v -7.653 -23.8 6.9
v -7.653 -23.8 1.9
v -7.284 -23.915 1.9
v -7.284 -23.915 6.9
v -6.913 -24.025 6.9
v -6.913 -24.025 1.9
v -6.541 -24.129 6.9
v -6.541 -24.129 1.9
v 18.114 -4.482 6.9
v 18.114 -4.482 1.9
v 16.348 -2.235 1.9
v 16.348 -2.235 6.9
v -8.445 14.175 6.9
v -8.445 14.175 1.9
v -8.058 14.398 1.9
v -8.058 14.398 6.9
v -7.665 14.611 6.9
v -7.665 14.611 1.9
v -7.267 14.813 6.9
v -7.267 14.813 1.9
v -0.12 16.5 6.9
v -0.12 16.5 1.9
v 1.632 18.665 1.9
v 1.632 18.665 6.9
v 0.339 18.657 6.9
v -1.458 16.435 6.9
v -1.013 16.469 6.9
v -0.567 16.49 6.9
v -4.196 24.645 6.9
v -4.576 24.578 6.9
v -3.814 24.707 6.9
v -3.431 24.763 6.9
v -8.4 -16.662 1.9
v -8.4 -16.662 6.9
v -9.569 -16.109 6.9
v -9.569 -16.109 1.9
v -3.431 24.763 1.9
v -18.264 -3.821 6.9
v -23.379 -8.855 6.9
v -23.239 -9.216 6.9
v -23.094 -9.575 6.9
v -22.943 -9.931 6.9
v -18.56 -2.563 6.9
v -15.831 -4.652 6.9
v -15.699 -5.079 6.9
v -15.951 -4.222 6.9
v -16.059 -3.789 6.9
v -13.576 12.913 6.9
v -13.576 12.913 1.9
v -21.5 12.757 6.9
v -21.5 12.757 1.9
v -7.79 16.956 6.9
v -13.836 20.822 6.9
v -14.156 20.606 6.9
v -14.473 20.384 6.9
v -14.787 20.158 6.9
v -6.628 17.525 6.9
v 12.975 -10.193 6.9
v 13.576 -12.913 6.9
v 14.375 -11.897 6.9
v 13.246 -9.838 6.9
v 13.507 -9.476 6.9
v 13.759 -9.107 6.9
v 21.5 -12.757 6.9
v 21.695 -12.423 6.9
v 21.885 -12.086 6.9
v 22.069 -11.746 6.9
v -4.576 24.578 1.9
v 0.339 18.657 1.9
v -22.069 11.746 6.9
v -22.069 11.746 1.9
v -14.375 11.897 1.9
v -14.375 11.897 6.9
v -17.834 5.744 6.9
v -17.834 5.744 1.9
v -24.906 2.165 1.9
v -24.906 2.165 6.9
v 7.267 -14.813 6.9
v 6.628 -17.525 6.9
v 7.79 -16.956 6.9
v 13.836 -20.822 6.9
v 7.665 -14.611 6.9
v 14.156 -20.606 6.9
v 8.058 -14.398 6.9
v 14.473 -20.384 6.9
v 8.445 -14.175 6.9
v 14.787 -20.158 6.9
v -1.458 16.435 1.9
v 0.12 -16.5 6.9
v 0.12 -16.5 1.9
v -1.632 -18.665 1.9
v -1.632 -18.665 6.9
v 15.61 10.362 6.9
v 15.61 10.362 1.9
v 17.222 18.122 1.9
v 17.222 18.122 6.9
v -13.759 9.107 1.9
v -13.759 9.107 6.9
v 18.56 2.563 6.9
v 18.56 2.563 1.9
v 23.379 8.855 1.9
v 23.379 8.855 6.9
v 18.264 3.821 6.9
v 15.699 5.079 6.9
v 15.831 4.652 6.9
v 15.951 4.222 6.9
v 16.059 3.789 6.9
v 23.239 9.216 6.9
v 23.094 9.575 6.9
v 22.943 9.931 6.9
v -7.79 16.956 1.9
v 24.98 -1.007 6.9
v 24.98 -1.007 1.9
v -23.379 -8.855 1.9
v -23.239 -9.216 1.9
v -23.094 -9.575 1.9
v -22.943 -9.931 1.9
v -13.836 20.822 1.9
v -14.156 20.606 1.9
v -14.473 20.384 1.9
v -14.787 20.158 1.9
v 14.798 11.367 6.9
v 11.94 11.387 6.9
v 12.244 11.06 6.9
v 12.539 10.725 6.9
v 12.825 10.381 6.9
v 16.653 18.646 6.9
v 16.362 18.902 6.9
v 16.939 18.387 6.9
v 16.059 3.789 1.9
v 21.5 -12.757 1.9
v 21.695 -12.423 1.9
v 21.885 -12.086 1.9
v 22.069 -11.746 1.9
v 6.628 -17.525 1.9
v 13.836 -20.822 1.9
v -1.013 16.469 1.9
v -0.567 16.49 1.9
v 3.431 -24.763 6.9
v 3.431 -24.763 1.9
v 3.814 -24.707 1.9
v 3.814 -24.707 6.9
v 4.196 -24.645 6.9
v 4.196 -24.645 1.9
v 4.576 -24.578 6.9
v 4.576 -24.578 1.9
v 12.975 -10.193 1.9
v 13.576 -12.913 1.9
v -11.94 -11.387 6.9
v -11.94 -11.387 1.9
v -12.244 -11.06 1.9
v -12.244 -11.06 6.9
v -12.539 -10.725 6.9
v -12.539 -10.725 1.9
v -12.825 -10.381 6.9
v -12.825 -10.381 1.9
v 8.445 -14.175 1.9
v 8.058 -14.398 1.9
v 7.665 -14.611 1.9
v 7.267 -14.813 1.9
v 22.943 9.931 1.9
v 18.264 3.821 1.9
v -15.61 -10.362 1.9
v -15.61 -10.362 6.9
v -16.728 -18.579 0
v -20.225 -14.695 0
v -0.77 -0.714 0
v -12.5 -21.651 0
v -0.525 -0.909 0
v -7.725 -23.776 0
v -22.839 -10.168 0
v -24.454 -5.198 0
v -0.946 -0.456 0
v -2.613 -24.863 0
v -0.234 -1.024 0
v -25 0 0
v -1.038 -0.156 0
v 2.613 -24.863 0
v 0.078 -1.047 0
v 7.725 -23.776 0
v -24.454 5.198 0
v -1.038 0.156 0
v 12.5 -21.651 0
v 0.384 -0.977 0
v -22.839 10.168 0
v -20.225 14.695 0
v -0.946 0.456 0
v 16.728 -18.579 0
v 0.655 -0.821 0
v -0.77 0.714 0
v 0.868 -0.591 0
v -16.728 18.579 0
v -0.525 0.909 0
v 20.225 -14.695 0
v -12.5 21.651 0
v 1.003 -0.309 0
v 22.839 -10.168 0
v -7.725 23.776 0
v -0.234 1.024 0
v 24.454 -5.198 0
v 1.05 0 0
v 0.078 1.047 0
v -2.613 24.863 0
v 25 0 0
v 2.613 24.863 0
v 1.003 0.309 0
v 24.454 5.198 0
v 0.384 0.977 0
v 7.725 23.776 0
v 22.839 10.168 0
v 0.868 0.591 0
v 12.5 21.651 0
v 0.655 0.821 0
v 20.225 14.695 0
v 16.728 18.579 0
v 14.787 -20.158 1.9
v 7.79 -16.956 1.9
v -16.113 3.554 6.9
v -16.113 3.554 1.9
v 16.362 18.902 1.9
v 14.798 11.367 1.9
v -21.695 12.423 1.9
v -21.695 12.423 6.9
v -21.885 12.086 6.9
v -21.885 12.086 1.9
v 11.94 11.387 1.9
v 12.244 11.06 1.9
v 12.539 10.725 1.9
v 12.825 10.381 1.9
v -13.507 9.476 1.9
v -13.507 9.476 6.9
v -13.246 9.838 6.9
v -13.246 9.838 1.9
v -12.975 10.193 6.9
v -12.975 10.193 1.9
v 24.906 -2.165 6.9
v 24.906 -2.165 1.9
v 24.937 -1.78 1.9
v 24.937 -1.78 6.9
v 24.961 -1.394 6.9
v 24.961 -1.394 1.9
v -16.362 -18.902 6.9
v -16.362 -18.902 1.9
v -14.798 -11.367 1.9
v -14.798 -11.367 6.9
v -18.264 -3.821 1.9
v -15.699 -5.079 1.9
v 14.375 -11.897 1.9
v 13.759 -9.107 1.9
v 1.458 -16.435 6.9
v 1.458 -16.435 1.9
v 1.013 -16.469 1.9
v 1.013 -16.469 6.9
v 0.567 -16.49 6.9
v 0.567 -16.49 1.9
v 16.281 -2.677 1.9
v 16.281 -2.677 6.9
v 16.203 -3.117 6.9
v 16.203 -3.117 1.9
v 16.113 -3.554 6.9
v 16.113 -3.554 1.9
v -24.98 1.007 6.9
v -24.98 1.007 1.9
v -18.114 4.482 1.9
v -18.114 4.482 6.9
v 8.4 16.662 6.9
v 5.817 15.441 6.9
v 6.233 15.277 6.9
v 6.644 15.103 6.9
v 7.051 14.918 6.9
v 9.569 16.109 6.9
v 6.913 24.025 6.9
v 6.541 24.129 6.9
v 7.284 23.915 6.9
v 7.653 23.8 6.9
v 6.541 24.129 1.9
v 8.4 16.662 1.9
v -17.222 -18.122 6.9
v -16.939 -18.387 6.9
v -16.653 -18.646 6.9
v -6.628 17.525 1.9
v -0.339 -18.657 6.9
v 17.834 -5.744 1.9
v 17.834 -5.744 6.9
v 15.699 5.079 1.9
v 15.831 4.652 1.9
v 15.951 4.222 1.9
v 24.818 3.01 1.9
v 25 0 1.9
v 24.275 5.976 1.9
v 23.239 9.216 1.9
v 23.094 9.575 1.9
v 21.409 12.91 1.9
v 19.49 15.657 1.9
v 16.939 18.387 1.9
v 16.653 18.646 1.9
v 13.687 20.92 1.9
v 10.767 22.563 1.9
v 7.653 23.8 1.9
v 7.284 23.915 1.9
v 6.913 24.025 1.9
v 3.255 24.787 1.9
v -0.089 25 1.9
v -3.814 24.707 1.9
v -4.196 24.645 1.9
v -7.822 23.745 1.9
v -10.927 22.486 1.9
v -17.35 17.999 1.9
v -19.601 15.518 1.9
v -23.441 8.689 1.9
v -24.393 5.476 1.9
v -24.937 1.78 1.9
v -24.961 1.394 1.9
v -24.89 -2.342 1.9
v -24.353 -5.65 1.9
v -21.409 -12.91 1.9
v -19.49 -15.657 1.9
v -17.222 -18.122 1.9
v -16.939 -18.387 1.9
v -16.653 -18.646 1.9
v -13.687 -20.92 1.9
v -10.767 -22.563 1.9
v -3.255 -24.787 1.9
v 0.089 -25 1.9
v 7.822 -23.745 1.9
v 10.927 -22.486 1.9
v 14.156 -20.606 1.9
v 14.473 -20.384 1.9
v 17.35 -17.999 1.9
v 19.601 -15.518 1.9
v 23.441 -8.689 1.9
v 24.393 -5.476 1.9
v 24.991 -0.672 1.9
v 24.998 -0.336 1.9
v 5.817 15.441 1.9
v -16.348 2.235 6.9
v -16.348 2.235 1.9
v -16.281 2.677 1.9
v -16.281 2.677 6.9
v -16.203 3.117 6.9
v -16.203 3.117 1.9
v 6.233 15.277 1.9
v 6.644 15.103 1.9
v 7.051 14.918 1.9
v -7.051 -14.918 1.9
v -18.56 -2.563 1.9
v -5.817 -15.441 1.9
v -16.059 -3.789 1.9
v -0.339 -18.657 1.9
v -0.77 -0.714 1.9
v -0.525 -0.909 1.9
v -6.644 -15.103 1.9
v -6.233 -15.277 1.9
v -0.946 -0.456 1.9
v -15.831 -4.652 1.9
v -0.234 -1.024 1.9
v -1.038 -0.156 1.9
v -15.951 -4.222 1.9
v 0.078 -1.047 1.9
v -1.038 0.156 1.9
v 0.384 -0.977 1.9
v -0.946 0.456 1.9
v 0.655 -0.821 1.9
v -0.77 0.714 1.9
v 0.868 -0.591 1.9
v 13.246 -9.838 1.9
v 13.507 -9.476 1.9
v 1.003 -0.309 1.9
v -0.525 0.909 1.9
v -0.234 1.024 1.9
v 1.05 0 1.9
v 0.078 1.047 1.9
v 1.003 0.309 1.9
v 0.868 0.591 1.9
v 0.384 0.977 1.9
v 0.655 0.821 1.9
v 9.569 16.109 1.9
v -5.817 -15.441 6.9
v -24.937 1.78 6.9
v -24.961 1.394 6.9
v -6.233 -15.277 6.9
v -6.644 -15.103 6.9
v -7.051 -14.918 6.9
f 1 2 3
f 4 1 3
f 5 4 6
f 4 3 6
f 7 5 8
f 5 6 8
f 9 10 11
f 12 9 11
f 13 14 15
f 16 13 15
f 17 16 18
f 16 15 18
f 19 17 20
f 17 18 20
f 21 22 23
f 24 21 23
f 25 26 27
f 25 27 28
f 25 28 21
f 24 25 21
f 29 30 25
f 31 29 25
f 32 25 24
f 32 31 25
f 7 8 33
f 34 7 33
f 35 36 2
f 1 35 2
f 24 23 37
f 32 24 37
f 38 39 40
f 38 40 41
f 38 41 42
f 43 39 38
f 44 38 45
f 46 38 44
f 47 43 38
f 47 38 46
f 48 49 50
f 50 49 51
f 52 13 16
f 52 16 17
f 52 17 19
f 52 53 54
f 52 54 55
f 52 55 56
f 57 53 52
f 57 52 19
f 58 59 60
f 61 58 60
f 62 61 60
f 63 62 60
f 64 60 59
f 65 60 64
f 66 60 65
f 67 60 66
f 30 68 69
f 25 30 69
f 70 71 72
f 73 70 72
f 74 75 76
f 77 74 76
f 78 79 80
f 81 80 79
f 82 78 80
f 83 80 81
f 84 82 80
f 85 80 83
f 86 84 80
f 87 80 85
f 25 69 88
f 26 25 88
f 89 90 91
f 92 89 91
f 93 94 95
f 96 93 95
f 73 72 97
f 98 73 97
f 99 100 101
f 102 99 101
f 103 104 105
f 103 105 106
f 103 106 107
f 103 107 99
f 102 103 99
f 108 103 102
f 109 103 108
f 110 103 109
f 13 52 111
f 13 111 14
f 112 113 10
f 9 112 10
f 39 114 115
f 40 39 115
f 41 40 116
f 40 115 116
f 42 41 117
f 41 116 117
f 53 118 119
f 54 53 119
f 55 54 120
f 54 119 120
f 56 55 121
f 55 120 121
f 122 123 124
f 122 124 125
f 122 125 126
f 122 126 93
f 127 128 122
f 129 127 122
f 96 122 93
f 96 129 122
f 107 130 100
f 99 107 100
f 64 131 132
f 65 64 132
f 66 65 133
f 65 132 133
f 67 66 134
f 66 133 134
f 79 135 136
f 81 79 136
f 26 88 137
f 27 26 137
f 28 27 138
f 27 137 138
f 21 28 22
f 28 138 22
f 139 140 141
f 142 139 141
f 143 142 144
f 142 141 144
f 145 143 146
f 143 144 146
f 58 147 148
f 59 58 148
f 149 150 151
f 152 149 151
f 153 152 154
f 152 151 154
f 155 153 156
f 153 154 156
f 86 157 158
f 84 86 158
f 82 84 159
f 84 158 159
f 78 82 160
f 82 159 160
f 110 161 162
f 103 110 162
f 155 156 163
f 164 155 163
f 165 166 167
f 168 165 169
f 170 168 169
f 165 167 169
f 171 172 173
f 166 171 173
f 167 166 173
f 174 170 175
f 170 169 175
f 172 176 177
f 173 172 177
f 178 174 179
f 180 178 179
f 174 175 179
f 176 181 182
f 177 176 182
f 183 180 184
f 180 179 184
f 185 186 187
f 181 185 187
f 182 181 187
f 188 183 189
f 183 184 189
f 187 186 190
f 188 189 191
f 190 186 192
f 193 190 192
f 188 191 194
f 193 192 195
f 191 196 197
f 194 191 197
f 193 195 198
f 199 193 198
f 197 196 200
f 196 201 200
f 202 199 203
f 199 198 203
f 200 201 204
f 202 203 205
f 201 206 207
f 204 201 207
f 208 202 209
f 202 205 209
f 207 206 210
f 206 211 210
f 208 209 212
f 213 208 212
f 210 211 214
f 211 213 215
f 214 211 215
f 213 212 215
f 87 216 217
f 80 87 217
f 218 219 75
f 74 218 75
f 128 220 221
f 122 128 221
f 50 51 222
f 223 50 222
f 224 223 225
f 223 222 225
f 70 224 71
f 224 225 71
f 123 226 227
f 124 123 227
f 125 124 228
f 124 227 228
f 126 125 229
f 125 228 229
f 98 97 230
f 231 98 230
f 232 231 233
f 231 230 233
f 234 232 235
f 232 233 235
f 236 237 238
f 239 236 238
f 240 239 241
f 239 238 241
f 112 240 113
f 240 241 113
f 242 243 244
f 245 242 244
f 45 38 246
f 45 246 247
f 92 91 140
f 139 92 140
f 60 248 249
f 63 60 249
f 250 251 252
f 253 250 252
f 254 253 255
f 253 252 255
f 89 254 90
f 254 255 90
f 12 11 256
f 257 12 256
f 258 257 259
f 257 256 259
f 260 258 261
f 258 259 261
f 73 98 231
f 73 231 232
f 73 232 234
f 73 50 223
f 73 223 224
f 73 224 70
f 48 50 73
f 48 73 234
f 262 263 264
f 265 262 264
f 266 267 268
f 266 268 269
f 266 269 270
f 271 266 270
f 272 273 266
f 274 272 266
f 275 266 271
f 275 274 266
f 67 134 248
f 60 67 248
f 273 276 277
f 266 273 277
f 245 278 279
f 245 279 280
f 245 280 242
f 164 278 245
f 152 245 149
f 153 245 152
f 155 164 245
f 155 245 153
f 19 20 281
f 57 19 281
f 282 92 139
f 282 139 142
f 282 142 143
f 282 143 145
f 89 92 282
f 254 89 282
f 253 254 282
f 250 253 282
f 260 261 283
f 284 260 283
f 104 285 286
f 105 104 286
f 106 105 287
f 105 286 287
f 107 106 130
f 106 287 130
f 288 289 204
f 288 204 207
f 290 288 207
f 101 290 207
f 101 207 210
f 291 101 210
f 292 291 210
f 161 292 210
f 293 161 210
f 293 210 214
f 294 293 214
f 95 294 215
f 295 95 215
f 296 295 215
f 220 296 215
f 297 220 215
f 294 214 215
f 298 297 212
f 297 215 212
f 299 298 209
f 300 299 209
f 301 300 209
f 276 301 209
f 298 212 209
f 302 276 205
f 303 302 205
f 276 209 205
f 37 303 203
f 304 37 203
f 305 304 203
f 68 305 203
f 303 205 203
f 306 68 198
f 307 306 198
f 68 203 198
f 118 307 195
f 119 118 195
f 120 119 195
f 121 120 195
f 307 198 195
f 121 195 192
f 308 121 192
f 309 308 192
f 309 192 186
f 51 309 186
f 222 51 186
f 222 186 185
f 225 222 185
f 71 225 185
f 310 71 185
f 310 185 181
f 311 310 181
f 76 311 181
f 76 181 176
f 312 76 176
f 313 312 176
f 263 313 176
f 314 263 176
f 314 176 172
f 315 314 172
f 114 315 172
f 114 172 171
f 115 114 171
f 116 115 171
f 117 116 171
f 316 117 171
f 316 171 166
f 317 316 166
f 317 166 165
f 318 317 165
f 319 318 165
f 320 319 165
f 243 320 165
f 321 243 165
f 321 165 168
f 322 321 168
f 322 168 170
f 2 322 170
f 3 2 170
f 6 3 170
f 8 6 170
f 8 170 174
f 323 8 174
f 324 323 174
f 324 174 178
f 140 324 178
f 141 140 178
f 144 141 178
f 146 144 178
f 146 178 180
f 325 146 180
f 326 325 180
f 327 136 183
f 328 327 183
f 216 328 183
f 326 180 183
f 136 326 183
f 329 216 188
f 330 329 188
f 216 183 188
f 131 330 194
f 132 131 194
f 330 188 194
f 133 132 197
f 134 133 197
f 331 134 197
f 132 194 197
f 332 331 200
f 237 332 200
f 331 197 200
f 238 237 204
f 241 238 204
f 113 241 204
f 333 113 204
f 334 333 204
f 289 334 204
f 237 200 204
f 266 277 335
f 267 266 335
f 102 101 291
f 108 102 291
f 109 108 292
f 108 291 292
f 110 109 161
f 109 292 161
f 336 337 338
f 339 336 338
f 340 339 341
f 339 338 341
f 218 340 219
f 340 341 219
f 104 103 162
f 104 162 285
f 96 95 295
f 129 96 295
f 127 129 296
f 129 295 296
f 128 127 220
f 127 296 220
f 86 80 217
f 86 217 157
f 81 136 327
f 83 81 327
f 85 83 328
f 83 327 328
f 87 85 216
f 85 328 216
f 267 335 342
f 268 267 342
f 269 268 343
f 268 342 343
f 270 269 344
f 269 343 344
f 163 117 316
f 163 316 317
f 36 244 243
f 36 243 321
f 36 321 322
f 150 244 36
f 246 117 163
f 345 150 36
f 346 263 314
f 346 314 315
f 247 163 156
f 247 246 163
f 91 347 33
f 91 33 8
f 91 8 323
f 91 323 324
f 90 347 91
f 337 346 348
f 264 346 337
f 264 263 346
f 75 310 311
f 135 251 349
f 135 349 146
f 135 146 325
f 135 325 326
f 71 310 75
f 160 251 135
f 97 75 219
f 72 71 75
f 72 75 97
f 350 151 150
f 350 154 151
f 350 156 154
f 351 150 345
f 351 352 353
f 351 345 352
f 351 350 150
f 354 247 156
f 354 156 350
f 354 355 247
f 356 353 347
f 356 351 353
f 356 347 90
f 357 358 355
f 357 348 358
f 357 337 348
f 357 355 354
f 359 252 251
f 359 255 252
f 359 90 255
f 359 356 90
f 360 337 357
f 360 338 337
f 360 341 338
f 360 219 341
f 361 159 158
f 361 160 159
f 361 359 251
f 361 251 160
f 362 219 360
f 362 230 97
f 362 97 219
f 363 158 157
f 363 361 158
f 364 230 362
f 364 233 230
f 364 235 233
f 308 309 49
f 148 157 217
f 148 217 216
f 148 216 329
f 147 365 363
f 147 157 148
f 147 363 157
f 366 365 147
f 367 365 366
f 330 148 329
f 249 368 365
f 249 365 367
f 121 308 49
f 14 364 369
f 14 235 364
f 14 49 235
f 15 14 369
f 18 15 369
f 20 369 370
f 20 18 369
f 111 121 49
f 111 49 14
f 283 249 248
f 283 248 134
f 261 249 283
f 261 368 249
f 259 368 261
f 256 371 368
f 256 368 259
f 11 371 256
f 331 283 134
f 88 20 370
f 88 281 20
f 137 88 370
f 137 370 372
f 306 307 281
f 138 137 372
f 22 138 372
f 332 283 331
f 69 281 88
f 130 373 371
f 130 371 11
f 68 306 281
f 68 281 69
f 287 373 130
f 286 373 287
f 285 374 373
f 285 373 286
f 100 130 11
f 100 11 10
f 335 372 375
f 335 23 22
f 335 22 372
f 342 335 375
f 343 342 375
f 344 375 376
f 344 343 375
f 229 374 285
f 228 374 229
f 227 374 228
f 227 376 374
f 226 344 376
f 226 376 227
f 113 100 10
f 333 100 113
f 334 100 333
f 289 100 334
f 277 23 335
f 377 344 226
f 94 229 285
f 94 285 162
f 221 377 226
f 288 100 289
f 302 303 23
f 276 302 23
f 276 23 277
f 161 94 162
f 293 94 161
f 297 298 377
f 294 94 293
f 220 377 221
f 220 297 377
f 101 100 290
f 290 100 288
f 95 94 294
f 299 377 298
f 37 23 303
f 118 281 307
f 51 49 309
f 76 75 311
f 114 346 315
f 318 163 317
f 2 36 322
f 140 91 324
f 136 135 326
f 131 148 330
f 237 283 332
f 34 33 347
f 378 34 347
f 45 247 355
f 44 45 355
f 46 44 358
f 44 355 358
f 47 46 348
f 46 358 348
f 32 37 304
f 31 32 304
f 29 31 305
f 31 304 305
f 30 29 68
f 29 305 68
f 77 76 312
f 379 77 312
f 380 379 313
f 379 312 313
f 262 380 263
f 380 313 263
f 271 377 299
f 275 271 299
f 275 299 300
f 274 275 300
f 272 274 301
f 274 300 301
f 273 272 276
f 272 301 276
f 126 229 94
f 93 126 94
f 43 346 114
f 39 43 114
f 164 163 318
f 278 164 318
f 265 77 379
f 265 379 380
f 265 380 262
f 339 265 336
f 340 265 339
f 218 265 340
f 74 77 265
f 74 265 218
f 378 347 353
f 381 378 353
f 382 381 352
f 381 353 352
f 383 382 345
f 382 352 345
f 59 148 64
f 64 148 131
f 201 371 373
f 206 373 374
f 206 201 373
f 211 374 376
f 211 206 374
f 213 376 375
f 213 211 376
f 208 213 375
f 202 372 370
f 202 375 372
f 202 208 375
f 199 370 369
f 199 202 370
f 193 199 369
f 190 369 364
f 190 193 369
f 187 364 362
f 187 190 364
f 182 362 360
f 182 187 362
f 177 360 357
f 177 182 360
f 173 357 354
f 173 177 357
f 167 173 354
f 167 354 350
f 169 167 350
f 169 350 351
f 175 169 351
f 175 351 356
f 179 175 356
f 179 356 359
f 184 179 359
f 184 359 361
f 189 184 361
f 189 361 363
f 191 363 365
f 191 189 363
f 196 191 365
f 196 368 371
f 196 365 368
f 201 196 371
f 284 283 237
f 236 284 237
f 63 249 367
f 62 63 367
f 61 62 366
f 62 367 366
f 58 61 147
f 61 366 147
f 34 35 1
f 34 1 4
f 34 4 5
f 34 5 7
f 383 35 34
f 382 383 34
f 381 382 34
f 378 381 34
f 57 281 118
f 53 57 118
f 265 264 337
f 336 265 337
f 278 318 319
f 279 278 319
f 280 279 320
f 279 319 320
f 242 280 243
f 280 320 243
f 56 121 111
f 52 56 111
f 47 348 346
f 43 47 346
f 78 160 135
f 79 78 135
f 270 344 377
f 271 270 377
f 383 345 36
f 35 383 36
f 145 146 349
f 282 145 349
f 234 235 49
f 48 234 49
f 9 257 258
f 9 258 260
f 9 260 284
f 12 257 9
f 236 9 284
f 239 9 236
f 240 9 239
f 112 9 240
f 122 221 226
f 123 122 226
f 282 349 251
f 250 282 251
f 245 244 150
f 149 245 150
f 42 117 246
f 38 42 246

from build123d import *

# Parameters (mm, degrees)
F0_R     = 25
F1_DEPTH = 1.9
F2_R     = 1.05
F3_DEPTH = 25.4
F5_DEPTH = 5


with BuildPart() as f1:
    # F0 (on Top) → F1 (new body)
    with BuildSketch(Plane.XY):
        Circle(F0_R)
    extrude(amount=F1_DEPTH)

    # F2 (on Top) → F3 (cut)
    with BuildSketch(Plane.XY):
        Circle(F2_R)
    extrude(amount=F3_DEPTH, mode=Mode.SUBTRACT)

    # F4 (on face) → F5 (join)
    with BuildSketch(Plane.XY.offset(1.9)):
        with BuildLine():
            ThreePointArc((-8.4449654791, 14.1750681853), (-7.8625386646, 14.5062223114), (-7.267148147, 14.8134586714))
            Line((-7.267148147, 14.8134586714), (-6.6282985683, 17.5245980034))
            Line((-6.6282985683, 17.5245980034), (-13.8357791201, 20.8223729709))
            ThreePointArc((-13.8357791201, 20.8223729709), (-14.3152843529, 20.4956735409), (-14.7870786227, 20.1579340659))
            Line((-14.7870786227, 20.1579340659), (-7.7896110966, 16.9562503322))
            Line((-7.7896110966, 16.9562503322), (-8.4449654791, 14.1750681853))
        make_face()
        with BuildLine():
            ThreePointArc((-1.4583194007, 16.4354283341), (-0.7898885826, 16.4810823682), (-0.1201554013, 16.4995624996))
            Line((-0.1201554013, 16.4995624996), (1.631747451, 18.6650281904))
            Line((1.631747451, 18.6650281904), (-3.4311172084, 24.7634293809))
            ThreePointArc((-3.4311172084, 24.7634293809), (-4.0048860655, 24.6771328886), (-4.5764976809, 24.5775439981))
            Line((-4.5764976809, 24.5775439981), (0.3388442045, 18.6568392545))
            Line((0.3388442045, 18.6568392545), (-1.4583194007, 16.4354283341))
        make_face()
        with BuildLine():
            ThreePointArc((5.8171647201, 15.4405503341), (6.4392086206, 15.1916619348), (7.0506355953, 14.917725621))
            Line((7.0506355953, 14.917725621), (9.5686058756, 16.1086206327))
            Line((9.5686058756, 16.1086206327), (7.6531195462, 23.7997848984))
            ThreePointArc((7.6531195462, 23.7997848984), (7.0987290239, 23.9709834226), (6.5405147537, 24.1292699176))
            Line((6.5405147537, 24.1292699176), (8.4001872552, 16.6622123514))
            Line((8.4001872552, 16.6622123514), (5.8171647201, 15.4405503341))
        make_face()
        with BuildLine():
            ThreePointArc((11.9404880253, 11.3874819745), (12.3929415847, 10.8933465417), (12.8249617418, 10.3812502291))
            Line((12.8249617418, 10.3812502291), (15.6102845553, 10.3617031995))
            Line((15.6102845553, 10.3617031995), (17.2215621154, 18.1223011316))
            ThreePointArc((17.2215621154, 18.1223011316), (16.7963537699, 18.5170867049), (16.3620980272, 18.9018980039))
            Line((16.3620980272, 18.9018980039), (14.7977701984, 11.3674299434))
            Line((14.7977701984, 11.3674299434), (11.9404880253, 11.3874819745))
        make_face()
        with BuildLine():
            ThreePointArc((15.6988512365, 5.0789831515), (15.8921004786, 4.4374702679), (16.0591469276, 3.7886409118))
            Line((16.0591469276, 3.7886409118), (18.5601549312, 2.5625233696))
            Line((18.5601549312, 2.5625233696), (23.379063099, 8.8554733703))
            ThreePointArc((23.379063099, 8.8554733703), (23.167254658, 9.3956538681), (22.9429671184, 9.9307733739))
            Line((22.9429671184, 9.9307733739), (18.2644732712, 3.8211886228))
            Line((18.2644732712, 3.8211886228), (15.6988512365, 5.0789831515))
        make_face()
        with BuildLine():
            Line((18.1136734135, -4.4818859684), (16.3478644266, -2.2354705742))
            ThreePointArc((16.3478644266, -2.2354705742), (16.2436339688, -2.8973014145), (16.1126211118, -3.5543552028))
            Line((16.1126211118, -3.5543552028), (17.8339589977, -5.7441956409))
            Line((17.8339589977, -5.7441956409), (24.9060539105, -2.1652894973))
            ThreePointArc((24.9060539105, -2.1652894973), (24.9495966334, -1.5867034474), (24.9797001948, -1.0072627157))
            Line((24.9797001948, -1.0072627157), (18.1136734135, -4.4818859684))
        make_face()
        with BuildLine():
            Line((14.3752383867, -11.8972680768), (13.7589825736, -9.1071619365))
            ThreePointArc((13.7589825736, -9.1071619365), (13.3779165365, -9.6582270186), (12.9747930765, -10.1933676782))
            Line((12.9747930765, -10.1933676782), (13.5755287655, -12.9132062568))
            Line((13.5755287655, -12.9132062568), (21.5000952923, -12.7571902244))
            ThreePointArc((21.5000952923, -12.7571902244), (21.7903650088, -12.2547946855), (22.0688972917, -11.7457980712))
            Line((22.0688972917, -11.7457980712), (14.3752383867, -11.8972680768))
        make_face()
        with BuildLine():
            Line((7.7896110966, -16.9562503322), (8.4449654791, -14.1750681853))
            ThreePointArc((8.4449654791, -14.1750681853), (7.8625386646, -14.5062223114), (7.267148147, -14.8134586714))
            Line((7.267148147, -14.8134586714), (6.6282985683, -17.5245980034))
            Line((6.6282985683, -17.5245980034), (13.8357791201, -20.8223729709))
            ThreePointArc((13.8357791201, -20.8223729709), (14.3152843529, -20.4956735409), (14.7870786227, -20.1579340659))
            Line((14.7870786227, -20.1579340659), (7.7896110966, -16.9562503322))
        make_face()
        with BuildLine():
            Line((-0.3388442045, -18.6568392545), (1.4583194007, -16.4354283341))
            ThreePointArc((1.4583194007, -16.4354283341), (0.7898885826, -16.4810823682), (0.1201554013, -16.4995624996))
            Line((0.1201554013, -16.4995624996), (-1.631747451, -18.6650281904))
            Line((-1.631747451, -18.6650281904), (3.4311172084, -24.7634293809))
            ThreePointArc((3.4311172084, -24.7634293809), (4.0048860655, -24.6771328886), (4.5764976809, -24.5775439981))
            Line((4.5764976809, -24.5775439981), (-0.3388442045, -18.6568392545))
        make_face()
        with BuildLine():
            Line((-8.4001872552, -16.6622123514), (-5.8171647201, -15.4405503341))
            ThreePointArc((-5.8171647201, -15.4405503341), (-6.4392086206, -15.1916619348), (-7.0506355953, -14.917725621))
            Line((-7.0506355953, -14.917725621), (-9.5686058756, -16.1086206327))
            Line((-9.5686058756, -16.1086206327), (-7.6531195462, -23.7997848984))
            ThreePointArc((-7.6531195462, -23.7997848984), (-7.0987290239, -23.9709834226), (-6.5405147537, -24.1292699176))
            Line((-6.5405147537, -24.1292699176), (-8.4001872552, -16.6622123514))
        make_face()
        with BuildLine():
            Line((-14.7977701984, -11.3674299434), (-11.9404880253, -11.3874819745))
            ThreePointArc((-11.9404880253, -11.3874819745), (-12.3929415847, -10.8933465417), (-12.8249617418, -10.3812502291))
            Line((-12.8249617418, -10.3812502291), (-15.6102845553, -10.3617031995))
            Line((-15.6102845553, -10.3617031995), (-17.2215621154, -18.1223011316))
            ThreePointArc((-17.2215621154, -18.1223011316), (-16.7963537699, -18.5170867049), (-16.3620980272, -18.9018980039))
            Line((-16.3620980272, -18.9018980039), (-14.7977701984, -11.3674299434))
        make_face()
        with BuildLine():
            Line((-18.2644732712, -3.8211886228), (-15.6988512365, -5.0789831515))
            ThreePointArc((-15.6988512365, -5.0789831515), (-15.8921004786, -4.4374702679), (-16.0591469276, -3.7886409118))
            Line((-16.0591469276, -3.7886409118), (-18.5601549312, -2.5625233696))
            Line((-18.5601549312, -2.5625233696), (-23.379063099, -8.8554733703))
            ThreePointArc((-23.379063099, -8.8554733703), (-23.167254658, -9.3956538681), (-22.9429671184, -9.9307733739))
            Line((-22.9429671184, -9.9307733739), (-18.2644732712, -3.8211886228))
        make_face()
        with BuildLine():
            ThreePointArc((-16.3478644266, 2.2354705742), (-16.2436339688, 2.8973014145), (-16.1126211118, 3.5543552028))
            Line((-16.1126211118, 3.5543552028), (-17.8339589977, 5.7441956409))
            Line((-17.8339589977, 5.7441956409), (-24.9060539105, 2.1652894973))
            ThreePointArc((-24.9060539105, 2.1652894973), (-24.9495966334, 1.5867034474), (-24.9797001948, 1.0072627157))
            Line((-24.9797001948, 1.0072627157), (-18.1136734135, 4.4818859684))
            Line((-18.1136734135, 4.4818859684), (-16.3478644266, 2.2354705742))
        make_face()
        with BuildLine():
            ThreePointArc((-13.7589825736, 9.1071619365), (-13.3779165365, 9.6582270186), (-12.9747930765, 10.1933676782))
            Line((-12.9747930765, 10.1933676782), (-13.5755287655, 12.9132062568))
            Line((-13.5755287655, 12.9132062568), (-21.5000952923, 12.7571902244))
            ThreePointArc((-21.5000952923, 12.7571902244), (-21.7903650088, 12.2547946855), (-22.0688972917, 11.7457980712))
            Line((-22.0688972917, 11.7457980712), (-14.3752383867, 11.8972680768))
            Line((-14.3752383867, 11.8972680768), (-13.7589825736, 9.1071619365))
        make_face()
    extrude(amount=F5_DEPTH)


solid = f1.part
